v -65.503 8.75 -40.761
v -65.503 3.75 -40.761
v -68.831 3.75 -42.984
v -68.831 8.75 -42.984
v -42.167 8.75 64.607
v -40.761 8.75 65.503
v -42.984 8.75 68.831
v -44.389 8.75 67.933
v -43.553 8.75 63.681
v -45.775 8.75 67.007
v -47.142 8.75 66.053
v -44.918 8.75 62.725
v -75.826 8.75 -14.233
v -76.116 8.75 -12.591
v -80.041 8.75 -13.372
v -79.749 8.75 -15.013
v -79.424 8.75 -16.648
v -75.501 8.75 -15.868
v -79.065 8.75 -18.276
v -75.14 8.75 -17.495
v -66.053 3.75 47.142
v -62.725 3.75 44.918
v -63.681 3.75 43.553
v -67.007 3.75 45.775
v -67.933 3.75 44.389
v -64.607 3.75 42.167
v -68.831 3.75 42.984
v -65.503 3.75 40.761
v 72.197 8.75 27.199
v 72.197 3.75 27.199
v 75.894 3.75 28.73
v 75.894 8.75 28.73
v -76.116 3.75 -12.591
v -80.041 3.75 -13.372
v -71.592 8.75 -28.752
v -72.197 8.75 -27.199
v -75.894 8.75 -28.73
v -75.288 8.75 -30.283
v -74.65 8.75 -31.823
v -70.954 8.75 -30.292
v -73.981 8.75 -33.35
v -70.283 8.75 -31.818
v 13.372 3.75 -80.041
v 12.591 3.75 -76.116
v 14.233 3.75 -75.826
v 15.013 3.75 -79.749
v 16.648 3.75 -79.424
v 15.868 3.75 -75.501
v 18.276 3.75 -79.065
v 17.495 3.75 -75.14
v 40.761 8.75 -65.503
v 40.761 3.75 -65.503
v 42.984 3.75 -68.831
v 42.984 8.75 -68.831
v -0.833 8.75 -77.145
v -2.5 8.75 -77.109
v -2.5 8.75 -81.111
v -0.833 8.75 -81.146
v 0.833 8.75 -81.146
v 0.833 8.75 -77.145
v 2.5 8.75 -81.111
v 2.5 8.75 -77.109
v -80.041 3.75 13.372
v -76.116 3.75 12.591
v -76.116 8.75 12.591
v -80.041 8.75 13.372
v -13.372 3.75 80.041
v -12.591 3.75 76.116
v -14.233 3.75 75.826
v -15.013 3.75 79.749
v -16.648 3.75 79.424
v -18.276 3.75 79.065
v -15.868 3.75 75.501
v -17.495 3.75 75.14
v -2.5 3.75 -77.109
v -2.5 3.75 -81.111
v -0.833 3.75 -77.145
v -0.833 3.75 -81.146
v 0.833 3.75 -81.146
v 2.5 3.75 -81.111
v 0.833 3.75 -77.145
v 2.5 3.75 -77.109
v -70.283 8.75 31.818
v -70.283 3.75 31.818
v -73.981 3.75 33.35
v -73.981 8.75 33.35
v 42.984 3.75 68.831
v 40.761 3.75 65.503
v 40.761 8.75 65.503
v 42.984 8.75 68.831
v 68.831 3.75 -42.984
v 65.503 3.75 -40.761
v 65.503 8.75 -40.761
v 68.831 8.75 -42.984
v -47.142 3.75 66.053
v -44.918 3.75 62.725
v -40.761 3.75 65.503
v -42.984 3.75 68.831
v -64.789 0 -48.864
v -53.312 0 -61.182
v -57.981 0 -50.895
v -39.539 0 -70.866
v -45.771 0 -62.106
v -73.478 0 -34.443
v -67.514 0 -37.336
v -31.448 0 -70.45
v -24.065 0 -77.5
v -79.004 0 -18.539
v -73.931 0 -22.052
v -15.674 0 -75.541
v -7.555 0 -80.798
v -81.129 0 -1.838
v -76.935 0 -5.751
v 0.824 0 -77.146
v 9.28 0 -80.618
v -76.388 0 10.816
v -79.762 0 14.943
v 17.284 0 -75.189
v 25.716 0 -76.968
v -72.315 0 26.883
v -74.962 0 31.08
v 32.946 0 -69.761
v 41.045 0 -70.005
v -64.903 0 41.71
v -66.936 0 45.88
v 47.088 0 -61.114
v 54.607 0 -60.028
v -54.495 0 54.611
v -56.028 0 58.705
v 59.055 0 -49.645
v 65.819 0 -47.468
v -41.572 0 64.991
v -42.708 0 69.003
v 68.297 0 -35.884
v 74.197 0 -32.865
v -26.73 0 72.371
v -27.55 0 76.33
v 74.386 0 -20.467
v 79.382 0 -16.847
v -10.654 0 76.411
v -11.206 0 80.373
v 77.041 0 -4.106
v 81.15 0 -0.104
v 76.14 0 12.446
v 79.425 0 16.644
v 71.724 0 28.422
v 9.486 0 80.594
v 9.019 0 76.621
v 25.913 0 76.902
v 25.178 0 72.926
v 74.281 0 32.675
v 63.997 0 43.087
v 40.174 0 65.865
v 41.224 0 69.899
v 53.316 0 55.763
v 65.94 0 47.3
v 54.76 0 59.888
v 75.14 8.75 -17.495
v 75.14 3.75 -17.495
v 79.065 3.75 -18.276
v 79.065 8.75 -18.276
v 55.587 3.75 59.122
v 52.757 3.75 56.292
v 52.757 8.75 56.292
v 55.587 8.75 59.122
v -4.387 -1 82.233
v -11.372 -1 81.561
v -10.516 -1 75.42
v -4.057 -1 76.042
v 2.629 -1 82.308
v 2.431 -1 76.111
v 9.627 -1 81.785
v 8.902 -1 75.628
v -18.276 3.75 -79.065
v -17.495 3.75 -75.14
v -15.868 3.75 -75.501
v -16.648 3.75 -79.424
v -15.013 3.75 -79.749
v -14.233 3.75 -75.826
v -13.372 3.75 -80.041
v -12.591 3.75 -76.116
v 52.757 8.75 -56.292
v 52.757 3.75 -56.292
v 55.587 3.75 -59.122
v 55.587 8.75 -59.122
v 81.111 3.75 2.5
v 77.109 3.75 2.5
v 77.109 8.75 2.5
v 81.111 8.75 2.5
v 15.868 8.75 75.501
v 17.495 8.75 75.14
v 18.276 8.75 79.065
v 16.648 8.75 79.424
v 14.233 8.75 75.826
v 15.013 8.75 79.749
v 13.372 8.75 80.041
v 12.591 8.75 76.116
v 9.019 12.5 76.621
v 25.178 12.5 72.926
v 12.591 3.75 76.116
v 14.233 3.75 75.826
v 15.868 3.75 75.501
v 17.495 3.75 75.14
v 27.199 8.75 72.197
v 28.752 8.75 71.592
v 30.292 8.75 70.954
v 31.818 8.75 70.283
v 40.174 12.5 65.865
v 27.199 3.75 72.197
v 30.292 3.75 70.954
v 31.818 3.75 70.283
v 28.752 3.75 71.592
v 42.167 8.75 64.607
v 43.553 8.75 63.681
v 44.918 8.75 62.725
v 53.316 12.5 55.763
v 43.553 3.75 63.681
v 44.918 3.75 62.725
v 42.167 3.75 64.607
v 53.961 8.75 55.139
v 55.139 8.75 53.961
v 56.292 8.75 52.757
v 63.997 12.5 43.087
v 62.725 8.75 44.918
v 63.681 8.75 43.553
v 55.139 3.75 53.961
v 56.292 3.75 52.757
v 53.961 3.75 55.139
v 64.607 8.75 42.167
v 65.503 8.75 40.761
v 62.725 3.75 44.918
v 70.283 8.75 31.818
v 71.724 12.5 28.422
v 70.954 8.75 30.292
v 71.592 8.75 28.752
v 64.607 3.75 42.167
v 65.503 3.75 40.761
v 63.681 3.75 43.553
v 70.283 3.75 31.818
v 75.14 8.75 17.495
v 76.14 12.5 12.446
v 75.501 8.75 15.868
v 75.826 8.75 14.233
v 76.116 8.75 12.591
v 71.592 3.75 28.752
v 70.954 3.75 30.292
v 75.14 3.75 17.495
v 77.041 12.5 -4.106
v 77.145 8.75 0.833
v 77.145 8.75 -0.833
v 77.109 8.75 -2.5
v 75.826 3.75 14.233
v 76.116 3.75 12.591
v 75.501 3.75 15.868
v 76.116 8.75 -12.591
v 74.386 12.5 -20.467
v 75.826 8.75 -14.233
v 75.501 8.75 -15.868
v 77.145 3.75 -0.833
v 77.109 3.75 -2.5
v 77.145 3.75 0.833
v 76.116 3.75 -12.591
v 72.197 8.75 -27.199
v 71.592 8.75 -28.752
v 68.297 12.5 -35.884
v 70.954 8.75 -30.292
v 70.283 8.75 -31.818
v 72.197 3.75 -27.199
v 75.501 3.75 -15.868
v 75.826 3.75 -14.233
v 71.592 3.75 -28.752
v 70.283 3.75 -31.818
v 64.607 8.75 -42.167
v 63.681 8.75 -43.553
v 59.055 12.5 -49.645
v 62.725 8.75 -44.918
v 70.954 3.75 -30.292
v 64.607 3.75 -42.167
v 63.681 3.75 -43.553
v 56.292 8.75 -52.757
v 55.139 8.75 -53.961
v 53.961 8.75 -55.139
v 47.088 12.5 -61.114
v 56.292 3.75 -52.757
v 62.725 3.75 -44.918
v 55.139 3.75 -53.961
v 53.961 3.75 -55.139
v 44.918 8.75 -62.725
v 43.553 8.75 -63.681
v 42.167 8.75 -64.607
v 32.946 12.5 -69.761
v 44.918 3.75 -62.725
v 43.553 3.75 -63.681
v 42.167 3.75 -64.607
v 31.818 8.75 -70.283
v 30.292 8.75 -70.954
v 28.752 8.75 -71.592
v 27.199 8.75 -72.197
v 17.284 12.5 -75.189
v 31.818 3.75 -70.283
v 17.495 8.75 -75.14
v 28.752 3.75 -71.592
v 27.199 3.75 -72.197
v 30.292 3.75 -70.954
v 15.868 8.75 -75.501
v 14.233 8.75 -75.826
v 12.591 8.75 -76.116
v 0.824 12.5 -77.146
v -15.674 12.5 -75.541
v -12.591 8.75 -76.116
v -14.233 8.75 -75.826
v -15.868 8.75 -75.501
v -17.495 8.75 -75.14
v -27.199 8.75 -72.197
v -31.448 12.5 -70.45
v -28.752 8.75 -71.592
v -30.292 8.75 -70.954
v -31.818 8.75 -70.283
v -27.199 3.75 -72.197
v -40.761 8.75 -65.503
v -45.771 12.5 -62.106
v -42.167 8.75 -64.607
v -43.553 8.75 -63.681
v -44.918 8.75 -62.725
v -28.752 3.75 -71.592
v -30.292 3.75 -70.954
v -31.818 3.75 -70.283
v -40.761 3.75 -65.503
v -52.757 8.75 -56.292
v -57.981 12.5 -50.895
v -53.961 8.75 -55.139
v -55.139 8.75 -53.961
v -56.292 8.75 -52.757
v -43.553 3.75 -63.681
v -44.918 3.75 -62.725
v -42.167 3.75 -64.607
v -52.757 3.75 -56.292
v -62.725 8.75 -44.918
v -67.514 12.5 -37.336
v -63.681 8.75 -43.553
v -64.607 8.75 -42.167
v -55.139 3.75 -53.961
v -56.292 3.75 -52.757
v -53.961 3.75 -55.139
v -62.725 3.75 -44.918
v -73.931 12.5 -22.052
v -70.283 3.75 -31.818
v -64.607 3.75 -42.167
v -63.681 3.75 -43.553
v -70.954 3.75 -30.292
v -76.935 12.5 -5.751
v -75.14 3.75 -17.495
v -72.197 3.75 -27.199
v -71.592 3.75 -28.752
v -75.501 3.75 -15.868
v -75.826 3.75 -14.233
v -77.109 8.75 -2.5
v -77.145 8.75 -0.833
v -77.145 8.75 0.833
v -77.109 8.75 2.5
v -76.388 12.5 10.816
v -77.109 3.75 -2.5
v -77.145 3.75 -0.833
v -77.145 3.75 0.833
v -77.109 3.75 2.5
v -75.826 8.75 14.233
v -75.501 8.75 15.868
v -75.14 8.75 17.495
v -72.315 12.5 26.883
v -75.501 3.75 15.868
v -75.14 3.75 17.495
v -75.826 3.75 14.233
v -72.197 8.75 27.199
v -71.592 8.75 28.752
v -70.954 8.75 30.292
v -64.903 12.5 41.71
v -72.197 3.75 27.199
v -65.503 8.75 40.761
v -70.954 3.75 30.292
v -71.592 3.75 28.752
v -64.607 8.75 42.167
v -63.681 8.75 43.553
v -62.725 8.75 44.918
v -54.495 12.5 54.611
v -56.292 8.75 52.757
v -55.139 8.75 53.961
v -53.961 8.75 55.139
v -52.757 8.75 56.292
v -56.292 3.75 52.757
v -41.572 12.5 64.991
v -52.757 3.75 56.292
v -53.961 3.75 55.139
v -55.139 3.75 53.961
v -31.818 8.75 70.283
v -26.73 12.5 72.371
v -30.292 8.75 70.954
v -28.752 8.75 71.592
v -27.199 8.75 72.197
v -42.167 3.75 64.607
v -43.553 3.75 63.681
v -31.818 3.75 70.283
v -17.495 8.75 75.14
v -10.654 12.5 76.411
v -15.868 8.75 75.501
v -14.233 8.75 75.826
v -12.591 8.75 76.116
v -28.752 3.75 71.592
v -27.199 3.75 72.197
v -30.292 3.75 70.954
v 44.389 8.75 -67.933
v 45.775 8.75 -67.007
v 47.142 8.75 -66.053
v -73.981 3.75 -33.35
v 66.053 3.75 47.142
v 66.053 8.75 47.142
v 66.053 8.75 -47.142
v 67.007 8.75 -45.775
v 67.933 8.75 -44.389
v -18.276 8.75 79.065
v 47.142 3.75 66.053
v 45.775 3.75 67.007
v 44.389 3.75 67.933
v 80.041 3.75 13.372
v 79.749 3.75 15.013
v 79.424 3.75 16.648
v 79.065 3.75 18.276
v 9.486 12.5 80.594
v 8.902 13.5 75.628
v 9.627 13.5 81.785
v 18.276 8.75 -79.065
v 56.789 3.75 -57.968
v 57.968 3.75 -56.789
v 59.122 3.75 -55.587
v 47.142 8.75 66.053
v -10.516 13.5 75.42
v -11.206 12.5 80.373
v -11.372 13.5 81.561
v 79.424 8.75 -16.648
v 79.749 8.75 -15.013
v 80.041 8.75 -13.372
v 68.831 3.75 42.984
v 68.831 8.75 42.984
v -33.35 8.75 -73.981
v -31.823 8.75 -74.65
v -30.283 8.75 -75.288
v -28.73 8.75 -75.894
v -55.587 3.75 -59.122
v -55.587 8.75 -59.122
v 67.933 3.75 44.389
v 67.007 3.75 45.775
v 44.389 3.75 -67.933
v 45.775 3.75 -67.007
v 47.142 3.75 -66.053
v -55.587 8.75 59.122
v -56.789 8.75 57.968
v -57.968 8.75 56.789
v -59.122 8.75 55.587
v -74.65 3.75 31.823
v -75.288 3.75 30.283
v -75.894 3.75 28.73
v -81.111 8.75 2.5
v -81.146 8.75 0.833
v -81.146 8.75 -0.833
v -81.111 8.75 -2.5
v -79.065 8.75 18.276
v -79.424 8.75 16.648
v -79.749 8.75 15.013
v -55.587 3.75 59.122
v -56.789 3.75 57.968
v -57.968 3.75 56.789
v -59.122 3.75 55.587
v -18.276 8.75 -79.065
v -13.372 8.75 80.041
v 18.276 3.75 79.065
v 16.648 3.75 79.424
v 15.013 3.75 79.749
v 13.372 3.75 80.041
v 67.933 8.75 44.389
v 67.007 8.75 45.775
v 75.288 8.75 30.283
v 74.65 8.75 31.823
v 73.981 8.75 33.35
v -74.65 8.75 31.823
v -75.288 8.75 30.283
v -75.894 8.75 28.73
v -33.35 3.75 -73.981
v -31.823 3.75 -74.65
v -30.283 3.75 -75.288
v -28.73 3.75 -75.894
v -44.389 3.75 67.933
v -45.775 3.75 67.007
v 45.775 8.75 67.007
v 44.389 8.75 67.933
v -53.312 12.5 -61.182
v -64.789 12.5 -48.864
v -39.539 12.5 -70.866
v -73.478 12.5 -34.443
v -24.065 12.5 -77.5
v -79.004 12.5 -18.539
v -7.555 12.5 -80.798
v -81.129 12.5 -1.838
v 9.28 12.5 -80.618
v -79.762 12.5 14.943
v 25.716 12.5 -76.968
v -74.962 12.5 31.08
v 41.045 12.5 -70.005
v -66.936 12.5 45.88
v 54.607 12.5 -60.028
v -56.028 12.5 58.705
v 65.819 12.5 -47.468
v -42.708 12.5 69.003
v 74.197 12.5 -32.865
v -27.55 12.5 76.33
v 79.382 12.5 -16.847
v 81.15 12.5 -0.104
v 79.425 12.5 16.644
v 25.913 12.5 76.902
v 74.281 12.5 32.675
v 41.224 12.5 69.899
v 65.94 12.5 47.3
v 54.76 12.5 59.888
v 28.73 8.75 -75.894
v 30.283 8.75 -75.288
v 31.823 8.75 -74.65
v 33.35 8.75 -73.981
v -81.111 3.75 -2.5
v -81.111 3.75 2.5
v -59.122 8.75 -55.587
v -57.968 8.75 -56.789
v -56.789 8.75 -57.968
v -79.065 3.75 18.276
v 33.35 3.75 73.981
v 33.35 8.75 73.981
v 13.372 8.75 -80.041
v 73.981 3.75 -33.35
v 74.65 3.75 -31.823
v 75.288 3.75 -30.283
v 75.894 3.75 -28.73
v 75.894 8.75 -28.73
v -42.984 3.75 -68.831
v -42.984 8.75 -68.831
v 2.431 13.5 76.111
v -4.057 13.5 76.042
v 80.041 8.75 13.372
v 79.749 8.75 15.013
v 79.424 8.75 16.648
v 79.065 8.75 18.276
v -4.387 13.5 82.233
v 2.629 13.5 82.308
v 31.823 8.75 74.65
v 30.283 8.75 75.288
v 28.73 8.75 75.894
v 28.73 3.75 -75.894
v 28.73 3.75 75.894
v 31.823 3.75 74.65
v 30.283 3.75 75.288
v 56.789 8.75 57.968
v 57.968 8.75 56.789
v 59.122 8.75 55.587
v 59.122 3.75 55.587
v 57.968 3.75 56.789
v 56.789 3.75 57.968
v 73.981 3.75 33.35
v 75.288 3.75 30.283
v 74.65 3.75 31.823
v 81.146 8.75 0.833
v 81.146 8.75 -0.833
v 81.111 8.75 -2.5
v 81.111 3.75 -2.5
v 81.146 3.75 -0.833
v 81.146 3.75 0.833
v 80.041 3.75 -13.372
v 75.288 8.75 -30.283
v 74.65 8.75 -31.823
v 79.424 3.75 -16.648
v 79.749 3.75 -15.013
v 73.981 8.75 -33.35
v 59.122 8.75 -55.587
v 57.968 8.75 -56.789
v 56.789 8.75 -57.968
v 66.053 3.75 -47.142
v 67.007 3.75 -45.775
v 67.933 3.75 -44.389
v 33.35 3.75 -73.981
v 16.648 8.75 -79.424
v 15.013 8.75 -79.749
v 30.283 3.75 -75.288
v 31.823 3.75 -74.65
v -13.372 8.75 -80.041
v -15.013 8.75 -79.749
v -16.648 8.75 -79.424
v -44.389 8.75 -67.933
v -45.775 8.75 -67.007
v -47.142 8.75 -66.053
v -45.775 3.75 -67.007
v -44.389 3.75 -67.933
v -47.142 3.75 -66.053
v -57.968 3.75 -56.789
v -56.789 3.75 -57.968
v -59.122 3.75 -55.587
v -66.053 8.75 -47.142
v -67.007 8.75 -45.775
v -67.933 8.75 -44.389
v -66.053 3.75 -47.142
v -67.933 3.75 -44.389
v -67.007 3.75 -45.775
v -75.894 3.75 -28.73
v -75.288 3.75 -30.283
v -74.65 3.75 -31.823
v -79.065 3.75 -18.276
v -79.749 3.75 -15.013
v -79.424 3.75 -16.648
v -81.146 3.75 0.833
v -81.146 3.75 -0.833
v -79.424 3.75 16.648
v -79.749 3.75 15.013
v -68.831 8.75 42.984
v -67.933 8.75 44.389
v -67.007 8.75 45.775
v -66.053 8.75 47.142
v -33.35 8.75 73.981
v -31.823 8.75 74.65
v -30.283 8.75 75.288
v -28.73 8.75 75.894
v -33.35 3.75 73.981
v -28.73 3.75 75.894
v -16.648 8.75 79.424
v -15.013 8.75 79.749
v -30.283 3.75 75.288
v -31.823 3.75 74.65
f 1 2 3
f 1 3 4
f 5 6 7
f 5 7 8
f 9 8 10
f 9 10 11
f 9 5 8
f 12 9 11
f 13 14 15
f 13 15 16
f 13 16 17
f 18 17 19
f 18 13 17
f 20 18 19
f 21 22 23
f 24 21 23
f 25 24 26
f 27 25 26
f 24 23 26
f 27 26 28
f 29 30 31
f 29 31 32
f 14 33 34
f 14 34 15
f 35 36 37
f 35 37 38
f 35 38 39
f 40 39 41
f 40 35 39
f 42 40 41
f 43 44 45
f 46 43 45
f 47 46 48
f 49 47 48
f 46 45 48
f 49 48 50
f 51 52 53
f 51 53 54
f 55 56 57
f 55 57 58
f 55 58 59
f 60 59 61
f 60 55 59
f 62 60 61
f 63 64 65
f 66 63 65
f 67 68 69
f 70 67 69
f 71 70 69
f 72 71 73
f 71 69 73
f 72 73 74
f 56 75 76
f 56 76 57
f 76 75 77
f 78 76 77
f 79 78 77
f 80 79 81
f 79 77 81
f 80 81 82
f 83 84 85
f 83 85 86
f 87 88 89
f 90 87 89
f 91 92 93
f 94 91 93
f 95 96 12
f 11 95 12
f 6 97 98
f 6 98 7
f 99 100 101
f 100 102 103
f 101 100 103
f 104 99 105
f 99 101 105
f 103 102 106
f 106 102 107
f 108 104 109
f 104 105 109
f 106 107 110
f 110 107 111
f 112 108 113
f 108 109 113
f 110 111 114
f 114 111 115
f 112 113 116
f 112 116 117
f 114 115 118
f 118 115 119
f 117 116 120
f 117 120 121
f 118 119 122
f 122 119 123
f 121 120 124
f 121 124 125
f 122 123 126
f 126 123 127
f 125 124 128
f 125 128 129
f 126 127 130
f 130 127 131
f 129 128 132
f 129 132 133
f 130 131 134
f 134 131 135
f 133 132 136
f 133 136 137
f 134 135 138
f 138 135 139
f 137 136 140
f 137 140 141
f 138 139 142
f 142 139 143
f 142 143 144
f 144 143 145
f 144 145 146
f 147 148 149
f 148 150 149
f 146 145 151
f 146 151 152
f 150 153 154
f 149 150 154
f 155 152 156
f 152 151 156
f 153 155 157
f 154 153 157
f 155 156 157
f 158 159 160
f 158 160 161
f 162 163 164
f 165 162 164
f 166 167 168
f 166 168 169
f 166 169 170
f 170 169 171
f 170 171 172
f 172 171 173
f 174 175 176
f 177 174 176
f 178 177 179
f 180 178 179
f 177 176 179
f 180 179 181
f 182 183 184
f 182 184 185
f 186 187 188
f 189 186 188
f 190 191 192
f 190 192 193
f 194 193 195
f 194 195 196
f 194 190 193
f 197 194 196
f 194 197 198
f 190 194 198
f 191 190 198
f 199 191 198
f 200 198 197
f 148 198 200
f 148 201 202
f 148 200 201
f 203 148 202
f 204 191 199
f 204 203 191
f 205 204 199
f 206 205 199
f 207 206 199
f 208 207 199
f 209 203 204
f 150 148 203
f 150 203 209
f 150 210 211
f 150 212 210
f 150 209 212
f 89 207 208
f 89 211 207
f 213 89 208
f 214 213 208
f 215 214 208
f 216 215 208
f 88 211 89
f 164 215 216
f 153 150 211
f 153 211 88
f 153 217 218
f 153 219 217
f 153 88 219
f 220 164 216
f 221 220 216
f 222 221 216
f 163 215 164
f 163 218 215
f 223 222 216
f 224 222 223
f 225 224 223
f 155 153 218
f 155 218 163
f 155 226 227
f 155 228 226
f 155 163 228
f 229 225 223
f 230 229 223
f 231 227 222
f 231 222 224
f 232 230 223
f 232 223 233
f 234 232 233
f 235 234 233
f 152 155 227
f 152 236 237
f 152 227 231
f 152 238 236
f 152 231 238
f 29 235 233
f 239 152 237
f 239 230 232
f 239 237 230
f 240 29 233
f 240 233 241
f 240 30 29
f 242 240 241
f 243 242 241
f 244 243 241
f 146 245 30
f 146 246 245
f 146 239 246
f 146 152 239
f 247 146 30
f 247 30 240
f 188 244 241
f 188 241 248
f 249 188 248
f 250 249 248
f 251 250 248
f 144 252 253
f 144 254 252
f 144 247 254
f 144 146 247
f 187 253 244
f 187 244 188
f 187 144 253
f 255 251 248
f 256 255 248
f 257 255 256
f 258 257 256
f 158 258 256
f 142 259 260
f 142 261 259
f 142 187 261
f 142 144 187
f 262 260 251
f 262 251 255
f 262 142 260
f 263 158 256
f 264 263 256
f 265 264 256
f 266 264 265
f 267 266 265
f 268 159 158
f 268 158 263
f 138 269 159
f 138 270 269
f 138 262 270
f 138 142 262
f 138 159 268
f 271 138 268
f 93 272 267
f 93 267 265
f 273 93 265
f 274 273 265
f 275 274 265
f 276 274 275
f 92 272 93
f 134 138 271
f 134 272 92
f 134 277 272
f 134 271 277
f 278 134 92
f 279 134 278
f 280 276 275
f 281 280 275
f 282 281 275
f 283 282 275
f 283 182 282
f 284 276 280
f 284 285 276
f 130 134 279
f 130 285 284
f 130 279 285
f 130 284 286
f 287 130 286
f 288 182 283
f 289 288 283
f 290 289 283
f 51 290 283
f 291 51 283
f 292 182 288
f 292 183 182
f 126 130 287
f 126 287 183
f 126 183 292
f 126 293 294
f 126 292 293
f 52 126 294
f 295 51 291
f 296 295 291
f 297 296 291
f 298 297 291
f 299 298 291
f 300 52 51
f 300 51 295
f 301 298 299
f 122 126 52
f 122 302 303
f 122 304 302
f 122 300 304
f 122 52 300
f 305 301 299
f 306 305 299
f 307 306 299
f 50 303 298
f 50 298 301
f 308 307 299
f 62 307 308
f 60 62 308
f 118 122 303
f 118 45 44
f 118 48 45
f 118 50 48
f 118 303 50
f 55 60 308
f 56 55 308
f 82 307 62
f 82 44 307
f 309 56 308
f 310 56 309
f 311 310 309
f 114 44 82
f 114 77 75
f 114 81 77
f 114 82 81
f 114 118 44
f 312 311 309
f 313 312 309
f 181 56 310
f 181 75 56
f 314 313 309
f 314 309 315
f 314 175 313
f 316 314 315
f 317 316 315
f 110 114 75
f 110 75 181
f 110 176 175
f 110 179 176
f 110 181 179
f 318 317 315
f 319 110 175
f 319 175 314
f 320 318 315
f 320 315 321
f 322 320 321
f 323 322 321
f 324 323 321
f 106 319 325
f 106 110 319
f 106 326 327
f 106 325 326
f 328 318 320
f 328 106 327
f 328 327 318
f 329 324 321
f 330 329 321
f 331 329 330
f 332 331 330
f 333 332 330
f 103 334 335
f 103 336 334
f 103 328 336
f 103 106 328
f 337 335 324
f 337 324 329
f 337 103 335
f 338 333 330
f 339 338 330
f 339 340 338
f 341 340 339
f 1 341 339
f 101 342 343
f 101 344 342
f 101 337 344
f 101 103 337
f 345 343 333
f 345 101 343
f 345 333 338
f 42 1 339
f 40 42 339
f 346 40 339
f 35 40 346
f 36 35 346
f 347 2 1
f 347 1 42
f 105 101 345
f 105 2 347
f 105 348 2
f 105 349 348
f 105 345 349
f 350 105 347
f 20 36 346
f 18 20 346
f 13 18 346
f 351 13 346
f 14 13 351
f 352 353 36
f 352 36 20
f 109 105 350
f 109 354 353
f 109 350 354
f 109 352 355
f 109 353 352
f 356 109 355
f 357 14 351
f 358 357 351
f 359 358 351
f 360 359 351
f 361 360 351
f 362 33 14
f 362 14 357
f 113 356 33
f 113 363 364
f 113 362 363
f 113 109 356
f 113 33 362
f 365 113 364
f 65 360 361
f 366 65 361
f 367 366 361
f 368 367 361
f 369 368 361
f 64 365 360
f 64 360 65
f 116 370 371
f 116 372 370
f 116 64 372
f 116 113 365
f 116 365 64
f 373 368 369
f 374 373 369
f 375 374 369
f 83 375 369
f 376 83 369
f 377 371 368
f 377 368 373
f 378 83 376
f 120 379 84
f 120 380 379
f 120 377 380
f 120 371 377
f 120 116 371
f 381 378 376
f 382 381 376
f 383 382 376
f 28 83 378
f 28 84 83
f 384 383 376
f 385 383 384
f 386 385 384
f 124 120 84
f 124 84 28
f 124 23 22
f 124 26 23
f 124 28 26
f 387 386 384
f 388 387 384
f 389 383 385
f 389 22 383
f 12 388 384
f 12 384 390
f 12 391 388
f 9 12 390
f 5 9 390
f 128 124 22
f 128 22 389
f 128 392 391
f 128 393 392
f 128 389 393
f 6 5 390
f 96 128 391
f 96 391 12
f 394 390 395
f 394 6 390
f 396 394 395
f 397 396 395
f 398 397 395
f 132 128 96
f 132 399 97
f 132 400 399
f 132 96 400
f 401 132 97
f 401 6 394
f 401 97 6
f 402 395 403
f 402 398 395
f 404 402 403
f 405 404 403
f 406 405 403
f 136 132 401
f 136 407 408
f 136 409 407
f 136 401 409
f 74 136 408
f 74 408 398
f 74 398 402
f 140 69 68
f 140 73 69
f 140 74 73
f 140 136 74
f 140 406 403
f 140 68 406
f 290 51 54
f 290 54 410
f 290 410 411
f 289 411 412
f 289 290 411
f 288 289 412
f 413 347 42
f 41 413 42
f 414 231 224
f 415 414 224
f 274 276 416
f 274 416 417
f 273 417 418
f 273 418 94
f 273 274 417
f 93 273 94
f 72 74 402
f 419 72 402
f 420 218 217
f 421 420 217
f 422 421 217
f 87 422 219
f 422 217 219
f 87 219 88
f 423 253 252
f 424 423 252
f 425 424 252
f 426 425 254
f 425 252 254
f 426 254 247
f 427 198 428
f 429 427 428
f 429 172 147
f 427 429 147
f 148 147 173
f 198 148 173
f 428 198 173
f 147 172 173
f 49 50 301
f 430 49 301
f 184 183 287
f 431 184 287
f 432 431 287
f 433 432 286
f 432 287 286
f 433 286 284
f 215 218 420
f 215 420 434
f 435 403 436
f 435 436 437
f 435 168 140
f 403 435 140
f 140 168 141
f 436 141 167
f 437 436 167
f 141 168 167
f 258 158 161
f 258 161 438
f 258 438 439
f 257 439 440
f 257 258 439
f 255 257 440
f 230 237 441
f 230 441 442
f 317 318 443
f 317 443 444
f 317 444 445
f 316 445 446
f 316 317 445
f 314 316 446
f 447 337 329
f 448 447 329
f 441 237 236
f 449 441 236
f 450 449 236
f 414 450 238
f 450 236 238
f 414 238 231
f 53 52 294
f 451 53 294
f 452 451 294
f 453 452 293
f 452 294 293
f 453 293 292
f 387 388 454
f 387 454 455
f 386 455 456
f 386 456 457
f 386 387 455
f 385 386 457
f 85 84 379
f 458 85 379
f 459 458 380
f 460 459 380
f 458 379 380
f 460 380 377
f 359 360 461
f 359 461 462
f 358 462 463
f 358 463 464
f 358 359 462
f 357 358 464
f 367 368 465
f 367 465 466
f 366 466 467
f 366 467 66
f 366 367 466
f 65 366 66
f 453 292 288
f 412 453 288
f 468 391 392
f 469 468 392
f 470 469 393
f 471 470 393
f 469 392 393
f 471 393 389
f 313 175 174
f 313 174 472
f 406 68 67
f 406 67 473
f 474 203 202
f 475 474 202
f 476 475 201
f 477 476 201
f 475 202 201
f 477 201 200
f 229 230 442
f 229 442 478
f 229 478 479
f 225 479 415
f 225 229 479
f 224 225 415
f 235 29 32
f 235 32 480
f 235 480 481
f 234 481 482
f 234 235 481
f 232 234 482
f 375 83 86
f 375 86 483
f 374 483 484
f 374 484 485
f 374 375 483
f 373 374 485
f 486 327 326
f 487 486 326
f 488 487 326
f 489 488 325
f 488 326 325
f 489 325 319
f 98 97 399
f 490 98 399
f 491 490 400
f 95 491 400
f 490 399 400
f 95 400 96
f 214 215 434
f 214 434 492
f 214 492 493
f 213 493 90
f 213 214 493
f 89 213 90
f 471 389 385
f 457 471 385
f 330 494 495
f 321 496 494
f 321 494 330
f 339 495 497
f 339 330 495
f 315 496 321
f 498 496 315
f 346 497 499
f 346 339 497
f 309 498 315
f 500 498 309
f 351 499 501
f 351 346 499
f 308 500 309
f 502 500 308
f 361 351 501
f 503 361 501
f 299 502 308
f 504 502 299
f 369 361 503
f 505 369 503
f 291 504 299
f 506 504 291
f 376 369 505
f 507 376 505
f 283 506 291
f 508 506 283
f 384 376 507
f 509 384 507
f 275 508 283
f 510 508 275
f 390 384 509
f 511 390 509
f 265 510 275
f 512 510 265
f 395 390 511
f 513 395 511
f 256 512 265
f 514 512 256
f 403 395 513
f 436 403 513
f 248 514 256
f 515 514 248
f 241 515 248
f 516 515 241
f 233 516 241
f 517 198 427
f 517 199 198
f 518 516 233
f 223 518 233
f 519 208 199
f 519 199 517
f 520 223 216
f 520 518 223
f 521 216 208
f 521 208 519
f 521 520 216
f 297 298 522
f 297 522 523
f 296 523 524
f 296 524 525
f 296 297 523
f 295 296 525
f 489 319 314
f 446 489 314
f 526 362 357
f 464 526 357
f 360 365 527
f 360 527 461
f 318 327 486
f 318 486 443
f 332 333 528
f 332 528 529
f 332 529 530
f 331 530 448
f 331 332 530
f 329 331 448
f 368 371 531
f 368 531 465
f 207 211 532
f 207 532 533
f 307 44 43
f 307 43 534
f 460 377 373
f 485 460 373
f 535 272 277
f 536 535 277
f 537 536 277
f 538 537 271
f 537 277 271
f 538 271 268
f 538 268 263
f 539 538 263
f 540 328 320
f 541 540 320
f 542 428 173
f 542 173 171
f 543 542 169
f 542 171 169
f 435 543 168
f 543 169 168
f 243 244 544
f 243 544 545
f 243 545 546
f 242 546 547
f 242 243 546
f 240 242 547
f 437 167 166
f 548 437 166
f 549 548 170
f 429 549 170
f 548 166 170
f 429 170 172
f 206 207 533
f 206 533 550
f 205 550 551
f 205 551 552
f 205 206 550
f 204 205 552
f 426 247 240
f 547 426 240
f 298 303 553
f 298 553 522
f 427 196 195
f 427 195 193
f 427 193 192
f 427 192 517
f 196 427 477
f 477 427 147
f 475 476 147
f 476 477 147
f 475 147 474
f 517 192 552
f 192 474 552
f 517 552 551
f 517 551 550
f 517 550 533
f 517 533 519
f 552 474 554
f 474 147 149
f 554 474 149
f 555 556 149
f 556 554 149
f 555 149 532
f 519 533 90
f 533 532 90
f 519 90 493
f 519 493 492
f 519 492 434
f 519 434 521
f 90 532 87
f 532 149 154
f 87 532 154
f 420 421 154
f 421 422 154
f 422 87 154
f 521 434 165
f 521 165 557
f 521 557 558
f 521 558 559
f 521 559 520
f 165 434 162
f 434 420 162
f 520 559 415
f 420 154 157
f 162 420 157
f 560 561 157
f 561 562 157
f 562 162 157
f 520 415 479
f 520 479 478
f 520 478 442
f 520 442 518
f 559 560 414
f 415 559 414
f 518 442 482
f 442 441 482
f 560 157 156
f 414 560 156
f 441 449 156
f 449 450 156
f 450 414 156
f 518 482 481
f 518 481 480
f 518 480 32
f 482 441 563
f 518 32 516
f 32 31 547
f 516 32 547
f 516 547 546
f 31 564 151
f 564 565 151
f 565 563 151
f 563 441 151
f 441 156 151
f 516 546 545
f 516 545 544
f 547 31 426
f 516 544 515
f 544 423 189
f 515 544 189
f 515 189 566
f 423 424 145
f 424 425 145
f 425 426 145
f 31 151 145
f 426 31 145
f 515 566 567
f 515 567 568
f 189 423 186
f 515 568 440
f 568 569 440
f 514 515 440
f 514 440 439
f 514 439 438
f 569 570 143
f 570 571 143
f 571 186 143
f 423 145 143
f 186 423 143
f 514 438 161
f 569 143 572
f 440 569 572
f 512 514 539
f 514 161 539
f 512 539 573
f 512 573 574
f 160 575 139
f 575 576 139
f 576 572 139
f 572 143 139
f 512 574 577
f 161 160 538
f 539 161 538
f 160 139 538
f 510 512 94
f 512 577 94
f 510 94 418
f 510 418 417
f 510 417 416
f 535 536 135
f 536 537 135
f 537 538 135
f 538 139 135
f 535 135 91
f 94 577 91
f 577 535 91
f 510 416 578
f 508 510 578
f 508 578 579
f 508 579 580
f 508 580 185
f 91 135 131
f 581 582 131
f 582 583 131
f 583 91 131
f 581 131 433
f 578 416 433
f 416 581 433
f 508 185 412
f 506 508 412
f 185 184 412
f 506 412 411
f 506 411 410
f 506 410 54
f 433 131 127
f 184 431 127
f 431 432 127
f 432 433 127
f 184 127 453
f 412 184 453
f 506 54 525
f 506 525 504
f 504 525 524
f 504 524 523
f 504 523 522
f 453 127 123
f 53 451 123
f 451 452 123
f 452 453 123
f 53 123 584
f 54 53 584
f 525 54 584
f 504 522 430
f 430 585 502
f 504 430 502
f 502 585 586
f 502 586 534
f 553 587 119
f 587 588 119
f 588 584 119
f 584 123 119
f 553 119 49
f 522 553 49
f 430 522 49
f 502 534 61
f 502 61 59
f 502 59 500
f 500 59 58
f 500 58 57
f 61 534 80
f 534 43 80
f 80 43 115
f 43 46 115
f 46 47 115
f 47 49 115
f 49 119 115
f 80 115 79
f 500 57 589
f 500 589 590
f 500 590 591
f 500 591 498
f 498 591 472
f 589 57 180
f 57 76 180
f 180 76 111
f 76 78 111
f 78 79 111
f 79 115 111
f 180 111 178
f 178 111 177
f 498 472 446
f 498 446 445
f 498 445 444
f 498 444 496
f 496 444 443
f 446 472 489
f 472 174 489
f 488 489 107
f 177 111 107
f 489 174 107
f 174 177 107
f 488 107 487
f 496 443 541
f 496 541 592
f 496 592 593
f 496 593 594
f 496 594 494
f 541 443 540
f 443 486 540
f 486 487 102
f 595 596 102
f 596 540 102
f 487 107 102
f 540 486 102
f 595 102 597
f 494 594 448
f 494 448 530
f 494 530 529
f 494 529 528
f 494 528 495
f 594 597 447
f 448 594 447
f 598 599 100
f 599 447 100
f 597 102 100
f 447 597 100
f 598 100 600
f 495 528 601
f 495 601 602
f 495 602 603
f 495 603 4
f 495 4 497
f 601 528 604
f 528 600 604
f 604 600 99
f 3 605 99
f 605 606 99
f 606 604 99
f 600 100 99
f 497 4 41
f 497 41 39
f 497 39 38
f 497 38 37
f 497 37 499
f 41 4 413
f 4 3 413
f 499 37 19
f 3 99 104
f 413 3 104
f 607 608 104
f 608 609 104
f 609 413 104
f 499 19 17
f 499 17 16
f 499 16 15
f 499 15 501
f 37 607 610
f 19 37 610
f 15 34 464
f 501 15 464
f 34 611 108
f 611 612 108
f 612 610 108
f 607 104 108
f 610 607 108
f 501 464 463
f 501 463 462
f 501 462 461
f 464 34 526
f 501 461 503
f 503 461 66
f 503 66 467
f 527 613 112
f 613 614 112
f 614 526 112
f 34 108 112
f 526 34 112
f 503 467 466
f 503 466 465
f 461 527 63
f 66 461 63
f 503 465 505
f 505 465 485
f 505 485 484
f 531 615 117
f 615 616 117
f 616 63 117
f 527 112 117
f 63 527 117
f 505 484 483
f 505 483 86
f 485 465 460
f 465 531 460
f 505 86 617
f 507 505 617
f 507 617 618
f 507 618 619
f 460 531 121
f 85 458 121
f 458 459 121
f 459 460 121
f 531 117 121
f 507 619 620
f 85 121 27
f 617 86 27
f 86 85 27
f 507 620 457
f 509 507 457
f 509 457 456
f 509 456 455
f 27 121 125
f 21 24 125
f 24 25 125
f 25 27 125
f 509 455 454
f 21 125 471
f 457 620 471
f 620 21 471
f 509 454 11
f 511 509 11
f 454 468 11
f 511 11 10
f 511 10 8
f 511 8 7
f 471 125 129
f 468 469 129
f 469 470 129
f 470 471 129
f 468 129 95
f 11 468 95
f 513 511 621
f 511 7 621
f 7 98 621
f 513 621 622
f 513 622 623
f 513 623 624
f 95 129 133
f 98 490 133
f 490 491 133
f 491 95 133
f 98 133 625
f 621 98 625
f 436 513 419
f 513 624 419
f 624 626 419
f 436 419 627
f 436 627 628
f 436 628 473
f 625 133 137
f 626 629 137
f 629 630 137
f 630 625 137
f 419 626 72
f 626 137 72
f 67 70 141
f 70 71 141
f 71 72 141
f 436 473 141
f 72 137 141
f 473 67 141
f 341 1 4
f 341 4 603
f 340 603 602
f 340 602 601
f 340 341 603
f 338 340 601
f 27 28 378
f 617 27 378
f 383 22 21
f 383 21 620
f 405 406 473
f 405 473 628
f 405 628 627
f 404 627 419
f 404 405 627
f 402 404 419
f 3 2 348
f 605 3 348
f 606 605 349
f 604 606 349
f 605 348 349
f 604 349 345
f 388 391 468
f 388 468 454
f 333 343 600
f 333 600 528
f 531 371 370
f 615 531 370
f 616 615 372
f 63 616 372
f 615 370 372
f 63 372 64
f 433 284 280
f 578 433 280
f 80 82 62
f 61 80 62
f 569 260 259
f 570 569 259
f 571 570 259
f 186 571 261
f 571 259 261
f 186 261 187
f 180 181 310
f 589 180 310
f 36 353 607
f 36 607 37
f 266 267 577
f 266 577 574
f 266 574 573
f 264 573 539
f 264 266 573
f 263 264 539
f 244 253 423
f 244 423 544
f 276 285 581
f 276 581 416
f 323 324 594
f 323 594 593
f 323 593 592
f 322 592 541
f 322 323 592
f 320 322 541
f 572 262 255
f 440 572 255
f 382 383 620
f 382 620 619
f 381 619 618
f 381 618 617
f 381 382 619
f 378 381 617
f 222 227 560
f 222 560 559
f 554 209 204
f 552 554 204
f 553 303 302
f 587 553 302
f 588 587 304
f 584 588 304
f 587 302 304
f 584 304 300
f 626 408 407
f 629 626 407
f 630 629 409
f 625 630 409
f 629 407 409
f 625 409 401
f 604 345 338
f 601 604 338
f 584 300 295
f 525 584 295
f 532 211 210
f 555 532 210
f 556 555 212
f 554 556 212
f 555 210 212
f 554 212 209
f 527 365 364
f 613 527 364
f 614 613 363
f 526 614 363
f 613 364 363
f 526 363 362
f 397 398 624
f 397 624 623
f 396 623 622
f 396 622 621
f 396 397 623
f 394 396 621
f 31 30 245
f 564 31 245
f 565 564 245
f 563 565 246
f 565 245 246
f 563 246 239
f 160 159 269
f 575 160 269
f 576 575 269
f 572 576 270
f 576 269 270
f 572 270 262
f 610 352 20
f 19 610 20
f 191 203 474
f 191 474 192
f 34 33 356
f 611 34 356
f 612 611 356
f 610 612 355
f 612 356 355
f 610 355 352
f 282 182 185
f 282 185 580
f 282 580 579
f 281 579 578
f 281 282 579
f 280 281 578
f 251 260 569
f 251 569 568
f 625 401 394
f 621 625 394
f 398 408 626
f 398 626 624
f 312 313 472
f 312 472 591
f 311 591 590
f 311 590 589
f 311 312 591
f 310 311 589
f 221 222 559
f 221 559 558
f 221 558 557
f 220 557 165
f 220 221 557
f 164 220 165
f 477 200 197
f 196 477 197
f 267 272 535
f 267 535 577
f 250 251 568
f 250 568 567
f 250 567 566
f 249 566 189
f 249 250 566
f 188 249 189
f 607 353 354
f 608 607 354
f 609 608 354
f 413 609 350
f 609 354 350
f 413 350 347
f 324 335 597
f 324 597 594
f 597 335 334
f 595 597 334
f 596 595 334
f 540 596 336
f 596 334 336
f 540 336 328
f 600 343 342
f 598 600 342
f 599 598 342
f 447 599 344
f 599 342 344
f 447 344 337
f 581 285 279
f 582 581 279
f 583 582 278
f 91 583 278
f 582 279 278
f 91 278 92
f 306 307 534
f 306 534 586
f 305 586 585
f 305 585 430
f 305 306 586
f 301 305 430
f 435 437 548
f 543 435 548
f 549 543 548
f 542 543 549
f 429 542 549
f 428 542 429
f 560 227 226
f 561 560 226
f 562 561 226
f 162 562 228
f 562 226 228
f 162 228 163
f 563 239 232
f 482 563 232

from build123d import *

# Parameters (mm, degrees)
SKETCH1_R                       = 81.15
SKETCH1_R_2                     = 77.15
BOSS_EXTRUDE1_DEPTH             = 12.5
SKETCH2_W                       = 5
SKETCH2_H                       = 5
CUT_EXTRUDE2_DEPTH              = 116.44217167
CIRPATTERN1_COUNT               = 16
CIRPATTERN1_ANGLE               = 168.75
CIRPATTERN1_THE_OTHER_WAY_COUNT = 16
CIRPATTERN1_THE_OTHER_WAY_ANGLE = 168.75
BOSS_EXTRUDE2_DEPTH             = 1
BOSS_EXTRUDE2_DEPTH_BACK        = 13.5


with BuildPart() as part:
    # Sketch1 → Boss-Extrude1 (new body)
    with BuildSketch(Plane(origin=(0, 0, 0), x_dir=(1, 0, 0), z_dir=(0, 1, 0))):
        with Locations(Location((0, 0, 0), (0, 0, 270))):
            Circle(SKETCH1_R)
        with Locations(Location((0, 0, 0), (0, 0, 270))):
            Circle(SKETCH1_R_2, mode=Mode.SUBTRACT)
    extrude(amount=BOSS_EXTRUDE1_DEPTH)

    # Sketch2 → Cut-Extrude2 (cut, through all)
    with BuildSketch(Plane.XY):
        with Locations((0, 6.25)):
            Rectangle(SKETCH2_W, SKETCH2_H)
    cut_extrude2 = extrude(amount=-CUT_EXTRUDE2_DEPTH, mode=Mode.SUBTRACT)

    # CirPattern1: Cut-Extrude2 ×16 about axis
    cirpattern1_axis = Axis((0, 0, 0), (0, 1, 0))
    for i in range(1, CIRPATTERN1_COUNT):
        add(cut_extrude2.rotate(cirpattern1_axis, i * CIRPATTERN1_ANGLE / (CIRPATTERN1_COUNT - 1)), mode=Mode.SUBTRACT)

    # CirPattern1 the other way: Cut-Extrude2 ×16 about axis
    cirpattern1_the_other_way_axis = Axis((0, 0, 0), (0, -1, 0))
    for i in range(1, CIRPATTERN1_THE_OTHER_WAY_COUNT):
        add(cut_extrude2.rotate(cirpattern1_the_other_way_axis, i * CIRPATTERN1_THE_OTHER_WAY_ANGLE / (CIRPATTERN1_THE_OTHER_WAY_COUNT - 1)), mode=Mode.SUBTRACT)

    # Sketch3 → Boss-Extrude2 (add, two sides: drawn at the far end of the back side and taken through both)
    with BuildSketch(Plane(origin=(0, 12.5, 0), x_dir=(1, 0, 0), z_dir=(0, 1, 0)).offset(-BOSS_EXTRUDE2_DEPTH_BACK)):
        with BuildLine():
            Line((-10.515914532, -75.420408654), (-11.372101927, -81.561006601))
            ThreePointArc((-11.372101927, -81.561006601), (-0.879882913, -82.345299235), (9.626699335, -81.785384757))
            Line((9.626699335, -81.785384757), (8.901920515, -75.627893737))
            ThreePointArc((8.901920515, -75.627893737), (-0.813637934, -76.145653148), (-10.515914532, -75.420408654))
        make_face()
    extrude(amount=BOSS_EXTRUDE2_DEPTH + BOSS_EXTRUDE2_DEPTH_BACK)


solid = part.part
